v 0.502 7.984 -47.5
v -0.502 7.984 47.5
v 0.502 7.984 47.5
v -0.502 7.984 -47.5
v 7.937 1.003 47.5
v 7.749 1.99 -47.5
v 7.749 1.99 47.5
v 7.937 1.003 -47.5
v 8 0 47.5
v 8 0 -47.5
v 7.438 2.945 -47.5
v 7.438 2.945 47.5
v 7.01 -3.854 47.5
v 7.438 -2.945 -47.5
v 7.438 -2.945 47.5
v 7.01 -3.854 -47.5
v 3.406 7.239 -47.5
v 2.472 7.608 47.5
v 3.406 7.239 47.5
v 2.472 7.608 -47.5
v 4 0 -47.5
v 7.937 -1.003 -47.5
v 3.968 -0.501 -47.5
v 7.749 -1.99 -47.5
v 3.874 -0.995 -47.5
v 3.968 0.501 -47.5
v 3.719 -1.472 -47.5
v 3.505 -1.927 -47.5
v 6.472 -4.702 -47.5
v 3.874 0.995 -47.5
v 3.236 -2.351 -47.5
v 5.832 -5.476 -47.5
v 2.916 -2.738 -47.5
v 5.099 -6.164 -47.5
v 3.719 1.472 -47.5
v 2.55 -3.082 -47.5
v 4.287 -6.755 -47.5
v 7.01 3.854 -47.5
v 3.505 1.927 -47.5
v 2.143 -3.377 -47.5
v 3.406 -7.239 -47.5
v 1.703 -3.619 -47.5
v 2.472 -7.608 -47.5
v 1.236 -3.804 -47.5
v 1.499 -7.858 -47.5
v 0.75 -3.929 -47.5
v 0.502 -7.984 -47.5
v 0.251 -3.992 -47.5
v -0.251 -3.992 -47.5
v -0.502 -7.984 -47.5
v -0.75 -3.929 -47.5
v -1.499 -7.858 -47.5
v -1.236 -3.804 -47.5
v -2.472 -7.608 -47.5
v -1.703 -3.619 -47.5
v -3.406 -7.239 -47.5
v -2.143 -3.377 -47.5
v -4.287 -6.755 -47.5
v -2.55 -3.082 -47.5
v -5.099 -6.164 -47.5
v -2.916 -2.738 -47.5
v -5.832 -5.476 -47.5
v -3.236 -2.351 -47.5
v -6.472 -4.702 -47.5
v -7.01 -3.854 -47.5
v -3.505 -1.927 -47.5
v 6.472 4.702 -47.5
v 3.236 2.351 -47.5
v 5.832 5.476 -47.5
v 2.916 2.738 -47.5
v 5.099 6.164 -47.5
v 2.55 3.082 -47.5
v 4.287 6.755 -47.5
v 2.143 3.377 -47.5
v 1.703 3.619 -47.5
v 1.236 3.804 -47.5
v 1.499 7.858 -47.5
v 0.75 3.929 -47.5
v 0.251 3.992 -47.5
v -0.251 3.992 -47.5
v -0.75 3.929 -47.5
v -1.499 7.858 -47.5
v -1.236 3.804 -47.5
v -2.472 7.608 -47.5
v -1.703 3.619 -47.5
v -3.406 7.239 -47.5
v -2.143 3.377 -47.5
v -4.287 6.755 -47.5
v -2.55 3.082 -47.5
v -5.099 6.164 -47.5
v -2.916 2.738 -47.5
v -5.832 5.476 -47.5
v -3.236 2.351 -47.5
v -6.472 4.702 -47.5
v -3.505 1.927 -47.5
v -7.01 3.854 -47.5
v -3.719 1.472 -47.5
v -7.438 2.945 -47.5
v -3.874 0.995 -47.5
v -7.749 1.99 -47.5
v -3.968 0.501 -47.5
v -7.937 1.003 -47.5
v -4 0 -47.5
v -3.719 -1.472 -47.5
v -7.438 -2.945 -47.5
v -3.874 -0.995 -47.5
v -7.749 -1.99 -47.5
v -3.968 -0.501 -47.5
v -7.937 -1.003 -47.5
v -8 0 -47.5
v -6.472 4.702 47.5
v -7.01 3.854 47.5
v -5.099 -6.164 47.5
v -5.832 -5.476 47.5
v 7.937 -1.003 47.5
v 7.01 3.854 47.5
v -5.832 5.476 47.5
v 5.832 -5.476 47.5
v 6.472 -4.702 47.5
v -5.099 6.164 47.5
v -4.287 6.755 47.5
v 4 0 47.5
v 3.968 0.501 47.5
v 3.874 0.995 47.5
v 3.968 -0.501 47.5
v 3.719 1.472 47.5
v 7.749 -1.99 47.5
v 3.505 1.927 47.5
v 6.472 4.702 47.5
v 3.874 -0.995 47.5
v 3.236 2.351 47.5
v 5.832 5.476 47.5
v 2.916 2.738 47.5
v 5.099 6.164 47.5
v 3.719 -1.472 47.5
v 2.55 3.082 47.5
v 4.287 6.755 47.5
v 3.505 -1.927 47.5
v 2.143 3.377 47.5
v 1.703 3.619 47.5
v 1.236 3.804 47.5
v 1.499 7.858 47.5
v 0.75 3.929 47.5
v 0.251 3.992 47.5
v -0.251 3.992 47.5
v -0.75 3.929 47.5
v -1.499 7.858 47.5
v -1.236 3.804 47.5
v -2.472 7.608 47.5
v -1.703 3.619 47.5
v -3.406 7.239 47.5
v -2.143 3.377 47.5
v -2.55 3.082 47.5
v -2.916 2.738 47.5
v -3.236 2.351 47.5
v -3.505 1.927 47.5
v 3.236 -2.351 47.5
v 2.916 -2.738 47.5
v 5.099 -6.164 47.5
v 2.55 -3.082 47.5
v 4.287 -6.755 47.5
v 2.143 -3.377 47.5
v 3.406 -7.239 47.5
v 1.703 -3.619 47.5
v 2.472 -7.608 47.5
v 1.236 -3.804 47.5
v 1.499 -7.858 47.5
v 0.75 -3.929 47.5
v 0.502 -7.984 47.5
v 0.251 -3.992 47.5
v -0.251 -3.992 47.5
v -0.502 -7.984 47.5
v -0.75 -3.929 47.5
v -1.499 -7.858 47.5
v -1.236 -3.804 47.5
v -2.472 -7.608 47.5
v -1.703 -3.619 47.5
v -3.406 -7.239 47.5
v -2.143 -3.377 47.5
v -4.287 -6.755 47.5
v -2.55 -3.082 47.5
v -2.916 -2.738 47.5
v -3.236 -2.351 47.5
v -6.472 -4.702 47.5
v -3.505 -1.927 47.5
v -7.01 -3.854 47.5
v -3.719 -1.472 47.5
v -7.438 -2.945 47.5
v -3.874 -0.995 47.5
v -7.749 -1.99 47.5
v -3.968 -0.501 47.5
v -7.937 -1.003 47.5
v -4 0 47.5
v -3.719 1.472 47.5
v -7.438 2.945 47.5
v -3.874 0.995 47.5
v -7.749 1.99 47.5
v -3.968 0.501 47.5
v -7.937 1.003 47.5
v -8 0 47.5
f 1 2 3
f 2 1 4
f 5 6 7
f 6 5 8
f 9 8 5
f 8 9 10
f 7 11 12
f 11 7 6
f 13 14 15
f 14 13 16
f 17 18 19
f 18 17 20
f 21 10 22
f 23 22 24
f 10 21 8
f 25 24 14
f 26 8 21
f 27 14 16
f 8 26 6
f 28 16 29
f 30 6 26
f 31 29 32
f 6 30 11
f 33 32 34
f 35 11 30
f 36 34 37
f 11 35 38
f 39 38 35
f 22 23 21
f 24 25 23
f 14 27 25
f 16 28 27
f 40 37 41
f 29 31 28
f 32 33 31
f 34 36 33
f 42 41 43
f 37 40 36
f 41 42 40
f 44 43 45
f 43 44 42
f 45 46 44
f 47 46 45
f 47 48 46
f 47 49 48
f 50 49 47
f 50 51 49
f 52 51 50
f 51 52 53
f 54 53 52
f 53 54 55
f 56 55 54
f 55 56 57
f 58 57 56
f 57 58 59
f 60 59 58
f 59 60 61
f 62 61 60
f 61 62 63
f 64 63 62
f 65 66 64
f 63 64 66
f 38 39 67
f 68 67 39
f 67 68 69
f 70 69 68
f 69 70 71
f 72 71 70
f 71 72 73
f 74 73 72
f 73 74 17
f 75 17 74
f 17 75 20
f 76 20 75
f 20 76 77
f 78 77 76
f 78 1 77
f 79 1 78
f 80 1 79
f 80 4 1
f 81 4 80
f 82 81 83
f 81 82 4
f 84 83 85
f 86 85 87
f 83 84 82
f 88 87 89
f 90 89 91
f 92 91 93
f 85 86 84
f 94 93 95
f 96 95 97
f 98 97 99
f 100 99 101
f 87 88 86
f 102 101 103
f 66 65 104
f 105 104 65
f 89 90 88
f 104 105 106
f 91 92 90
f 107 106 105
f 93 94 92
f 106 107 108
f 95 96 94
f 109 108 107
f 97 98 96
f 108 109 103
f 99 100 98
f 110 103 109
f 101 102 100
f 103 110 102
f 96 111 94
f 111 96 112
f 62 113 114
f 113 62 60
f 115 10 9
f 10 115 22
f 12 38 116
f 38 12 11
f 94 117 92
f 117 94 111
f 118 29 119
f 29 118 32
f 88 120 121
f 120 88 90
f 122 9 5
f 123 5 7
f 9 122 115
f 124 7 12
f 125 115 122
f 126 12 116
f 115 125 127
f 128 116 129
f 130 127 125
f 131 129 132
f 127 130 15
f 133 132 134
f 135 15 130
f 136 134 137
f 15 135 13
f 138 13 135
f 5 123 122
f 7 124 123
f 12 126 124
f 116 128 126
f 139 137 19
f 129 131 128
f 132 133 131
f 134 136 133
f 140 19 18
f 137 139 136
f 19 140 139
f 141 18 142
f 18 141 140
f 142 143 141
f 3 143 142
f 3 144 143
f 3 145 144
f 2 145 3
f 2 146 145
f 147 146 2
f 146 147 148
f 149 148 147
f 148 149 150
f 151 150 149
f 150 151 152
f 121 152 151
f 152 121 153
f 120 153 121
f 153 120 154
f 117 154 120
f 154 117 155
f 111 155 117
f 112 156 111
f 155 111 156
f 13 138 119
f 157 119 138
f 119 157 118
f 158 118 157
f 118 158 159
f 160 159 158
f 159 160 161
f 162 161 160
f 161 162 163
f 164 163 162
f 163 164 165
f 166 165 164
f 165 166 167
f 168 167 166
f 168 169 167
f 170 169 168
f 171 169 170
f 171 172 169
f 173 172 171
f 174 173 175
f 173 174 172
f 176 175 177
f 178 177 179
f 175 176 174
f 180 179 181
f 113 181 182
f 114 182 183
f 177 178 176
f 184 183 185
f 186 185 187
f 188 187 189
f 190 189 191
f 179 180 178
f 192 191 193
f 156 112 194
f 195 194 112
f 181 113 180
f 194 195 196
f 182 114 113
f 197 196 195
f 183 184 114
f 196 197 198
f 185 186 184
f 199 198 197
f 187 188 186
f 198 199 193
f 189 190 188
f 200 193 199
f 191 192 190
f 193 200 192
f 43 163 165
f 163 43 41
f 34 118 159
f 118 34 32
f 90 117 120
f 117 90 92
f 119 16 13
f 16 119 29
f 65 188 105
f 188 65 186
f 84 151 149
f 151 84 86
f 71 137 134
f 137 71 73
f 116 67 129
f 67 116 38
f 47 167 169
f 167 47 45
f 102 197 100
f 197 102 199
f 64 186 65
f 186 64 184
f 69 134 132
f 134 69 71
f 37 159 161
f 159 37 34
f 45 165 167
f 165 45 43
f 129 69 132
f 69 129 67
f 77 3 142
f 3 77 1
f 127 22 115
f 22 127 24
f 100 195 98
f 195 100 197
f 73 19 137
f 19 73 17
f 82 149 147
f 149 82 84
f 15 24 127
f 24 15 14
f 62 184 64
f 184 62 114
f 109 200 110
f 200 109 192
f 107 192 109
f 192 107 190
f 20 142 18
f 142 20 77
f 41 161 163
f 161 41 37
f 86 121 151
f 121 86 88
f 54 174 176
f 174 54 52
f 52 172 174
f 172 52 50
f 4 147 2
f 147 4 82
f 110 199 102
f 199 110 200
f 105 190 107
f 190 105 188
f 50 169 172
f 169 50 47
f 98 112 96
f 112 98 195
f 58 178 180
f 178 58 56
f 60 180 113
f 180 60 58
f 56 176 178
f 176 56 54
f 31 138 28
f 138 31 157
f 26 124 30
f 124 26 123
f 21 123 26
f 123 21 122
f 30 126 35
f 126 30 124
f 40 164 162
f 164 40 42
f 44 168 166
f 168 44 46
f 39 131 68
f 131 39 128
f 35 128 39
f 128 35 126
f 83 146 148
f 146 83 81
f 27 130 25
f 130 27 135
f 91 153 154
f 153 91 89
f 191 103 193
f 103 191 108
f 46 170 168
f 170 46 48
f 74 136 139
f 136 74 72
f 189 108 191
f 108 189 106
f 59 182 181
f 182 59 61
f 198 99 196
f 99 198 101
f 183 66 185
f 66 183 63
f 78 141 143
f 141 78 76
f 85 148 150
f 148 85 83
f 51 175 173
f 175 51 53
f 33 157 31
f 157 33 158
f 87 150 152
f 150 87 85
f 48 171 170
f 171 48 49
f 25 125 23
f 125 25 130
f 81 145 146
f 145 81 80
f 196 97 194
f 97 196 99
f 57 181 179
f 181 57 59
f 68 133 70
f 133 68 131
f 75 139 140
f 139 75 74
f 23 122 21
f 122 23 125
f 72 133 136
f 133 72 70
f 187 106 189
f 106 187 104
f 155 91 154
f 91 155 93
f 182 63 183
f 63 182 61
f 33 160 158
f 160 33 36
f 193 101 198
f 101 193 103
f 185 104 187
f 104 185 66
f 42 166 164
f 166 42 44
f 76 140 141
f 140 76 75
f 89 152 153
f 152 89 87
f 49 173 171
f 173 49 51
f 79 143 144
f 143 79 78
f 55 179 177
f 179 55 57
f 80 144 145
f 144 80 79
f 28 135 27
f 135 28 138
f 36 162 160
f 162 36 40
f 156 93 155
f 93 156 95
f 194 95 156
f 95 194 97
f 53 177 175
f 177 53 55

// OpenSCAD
$fn = 50;


difference() {
	union() {
		translate(v = [0, 0, -47.5000000000]) {
			cylinder(h = 95, r = 8.0000000000);
		}
	}
	union() {
		translate(v = [0, 0, -100.0000000000]) {
			cylinder(h = 200, r = 4.0000000000);
		}
	}
}
